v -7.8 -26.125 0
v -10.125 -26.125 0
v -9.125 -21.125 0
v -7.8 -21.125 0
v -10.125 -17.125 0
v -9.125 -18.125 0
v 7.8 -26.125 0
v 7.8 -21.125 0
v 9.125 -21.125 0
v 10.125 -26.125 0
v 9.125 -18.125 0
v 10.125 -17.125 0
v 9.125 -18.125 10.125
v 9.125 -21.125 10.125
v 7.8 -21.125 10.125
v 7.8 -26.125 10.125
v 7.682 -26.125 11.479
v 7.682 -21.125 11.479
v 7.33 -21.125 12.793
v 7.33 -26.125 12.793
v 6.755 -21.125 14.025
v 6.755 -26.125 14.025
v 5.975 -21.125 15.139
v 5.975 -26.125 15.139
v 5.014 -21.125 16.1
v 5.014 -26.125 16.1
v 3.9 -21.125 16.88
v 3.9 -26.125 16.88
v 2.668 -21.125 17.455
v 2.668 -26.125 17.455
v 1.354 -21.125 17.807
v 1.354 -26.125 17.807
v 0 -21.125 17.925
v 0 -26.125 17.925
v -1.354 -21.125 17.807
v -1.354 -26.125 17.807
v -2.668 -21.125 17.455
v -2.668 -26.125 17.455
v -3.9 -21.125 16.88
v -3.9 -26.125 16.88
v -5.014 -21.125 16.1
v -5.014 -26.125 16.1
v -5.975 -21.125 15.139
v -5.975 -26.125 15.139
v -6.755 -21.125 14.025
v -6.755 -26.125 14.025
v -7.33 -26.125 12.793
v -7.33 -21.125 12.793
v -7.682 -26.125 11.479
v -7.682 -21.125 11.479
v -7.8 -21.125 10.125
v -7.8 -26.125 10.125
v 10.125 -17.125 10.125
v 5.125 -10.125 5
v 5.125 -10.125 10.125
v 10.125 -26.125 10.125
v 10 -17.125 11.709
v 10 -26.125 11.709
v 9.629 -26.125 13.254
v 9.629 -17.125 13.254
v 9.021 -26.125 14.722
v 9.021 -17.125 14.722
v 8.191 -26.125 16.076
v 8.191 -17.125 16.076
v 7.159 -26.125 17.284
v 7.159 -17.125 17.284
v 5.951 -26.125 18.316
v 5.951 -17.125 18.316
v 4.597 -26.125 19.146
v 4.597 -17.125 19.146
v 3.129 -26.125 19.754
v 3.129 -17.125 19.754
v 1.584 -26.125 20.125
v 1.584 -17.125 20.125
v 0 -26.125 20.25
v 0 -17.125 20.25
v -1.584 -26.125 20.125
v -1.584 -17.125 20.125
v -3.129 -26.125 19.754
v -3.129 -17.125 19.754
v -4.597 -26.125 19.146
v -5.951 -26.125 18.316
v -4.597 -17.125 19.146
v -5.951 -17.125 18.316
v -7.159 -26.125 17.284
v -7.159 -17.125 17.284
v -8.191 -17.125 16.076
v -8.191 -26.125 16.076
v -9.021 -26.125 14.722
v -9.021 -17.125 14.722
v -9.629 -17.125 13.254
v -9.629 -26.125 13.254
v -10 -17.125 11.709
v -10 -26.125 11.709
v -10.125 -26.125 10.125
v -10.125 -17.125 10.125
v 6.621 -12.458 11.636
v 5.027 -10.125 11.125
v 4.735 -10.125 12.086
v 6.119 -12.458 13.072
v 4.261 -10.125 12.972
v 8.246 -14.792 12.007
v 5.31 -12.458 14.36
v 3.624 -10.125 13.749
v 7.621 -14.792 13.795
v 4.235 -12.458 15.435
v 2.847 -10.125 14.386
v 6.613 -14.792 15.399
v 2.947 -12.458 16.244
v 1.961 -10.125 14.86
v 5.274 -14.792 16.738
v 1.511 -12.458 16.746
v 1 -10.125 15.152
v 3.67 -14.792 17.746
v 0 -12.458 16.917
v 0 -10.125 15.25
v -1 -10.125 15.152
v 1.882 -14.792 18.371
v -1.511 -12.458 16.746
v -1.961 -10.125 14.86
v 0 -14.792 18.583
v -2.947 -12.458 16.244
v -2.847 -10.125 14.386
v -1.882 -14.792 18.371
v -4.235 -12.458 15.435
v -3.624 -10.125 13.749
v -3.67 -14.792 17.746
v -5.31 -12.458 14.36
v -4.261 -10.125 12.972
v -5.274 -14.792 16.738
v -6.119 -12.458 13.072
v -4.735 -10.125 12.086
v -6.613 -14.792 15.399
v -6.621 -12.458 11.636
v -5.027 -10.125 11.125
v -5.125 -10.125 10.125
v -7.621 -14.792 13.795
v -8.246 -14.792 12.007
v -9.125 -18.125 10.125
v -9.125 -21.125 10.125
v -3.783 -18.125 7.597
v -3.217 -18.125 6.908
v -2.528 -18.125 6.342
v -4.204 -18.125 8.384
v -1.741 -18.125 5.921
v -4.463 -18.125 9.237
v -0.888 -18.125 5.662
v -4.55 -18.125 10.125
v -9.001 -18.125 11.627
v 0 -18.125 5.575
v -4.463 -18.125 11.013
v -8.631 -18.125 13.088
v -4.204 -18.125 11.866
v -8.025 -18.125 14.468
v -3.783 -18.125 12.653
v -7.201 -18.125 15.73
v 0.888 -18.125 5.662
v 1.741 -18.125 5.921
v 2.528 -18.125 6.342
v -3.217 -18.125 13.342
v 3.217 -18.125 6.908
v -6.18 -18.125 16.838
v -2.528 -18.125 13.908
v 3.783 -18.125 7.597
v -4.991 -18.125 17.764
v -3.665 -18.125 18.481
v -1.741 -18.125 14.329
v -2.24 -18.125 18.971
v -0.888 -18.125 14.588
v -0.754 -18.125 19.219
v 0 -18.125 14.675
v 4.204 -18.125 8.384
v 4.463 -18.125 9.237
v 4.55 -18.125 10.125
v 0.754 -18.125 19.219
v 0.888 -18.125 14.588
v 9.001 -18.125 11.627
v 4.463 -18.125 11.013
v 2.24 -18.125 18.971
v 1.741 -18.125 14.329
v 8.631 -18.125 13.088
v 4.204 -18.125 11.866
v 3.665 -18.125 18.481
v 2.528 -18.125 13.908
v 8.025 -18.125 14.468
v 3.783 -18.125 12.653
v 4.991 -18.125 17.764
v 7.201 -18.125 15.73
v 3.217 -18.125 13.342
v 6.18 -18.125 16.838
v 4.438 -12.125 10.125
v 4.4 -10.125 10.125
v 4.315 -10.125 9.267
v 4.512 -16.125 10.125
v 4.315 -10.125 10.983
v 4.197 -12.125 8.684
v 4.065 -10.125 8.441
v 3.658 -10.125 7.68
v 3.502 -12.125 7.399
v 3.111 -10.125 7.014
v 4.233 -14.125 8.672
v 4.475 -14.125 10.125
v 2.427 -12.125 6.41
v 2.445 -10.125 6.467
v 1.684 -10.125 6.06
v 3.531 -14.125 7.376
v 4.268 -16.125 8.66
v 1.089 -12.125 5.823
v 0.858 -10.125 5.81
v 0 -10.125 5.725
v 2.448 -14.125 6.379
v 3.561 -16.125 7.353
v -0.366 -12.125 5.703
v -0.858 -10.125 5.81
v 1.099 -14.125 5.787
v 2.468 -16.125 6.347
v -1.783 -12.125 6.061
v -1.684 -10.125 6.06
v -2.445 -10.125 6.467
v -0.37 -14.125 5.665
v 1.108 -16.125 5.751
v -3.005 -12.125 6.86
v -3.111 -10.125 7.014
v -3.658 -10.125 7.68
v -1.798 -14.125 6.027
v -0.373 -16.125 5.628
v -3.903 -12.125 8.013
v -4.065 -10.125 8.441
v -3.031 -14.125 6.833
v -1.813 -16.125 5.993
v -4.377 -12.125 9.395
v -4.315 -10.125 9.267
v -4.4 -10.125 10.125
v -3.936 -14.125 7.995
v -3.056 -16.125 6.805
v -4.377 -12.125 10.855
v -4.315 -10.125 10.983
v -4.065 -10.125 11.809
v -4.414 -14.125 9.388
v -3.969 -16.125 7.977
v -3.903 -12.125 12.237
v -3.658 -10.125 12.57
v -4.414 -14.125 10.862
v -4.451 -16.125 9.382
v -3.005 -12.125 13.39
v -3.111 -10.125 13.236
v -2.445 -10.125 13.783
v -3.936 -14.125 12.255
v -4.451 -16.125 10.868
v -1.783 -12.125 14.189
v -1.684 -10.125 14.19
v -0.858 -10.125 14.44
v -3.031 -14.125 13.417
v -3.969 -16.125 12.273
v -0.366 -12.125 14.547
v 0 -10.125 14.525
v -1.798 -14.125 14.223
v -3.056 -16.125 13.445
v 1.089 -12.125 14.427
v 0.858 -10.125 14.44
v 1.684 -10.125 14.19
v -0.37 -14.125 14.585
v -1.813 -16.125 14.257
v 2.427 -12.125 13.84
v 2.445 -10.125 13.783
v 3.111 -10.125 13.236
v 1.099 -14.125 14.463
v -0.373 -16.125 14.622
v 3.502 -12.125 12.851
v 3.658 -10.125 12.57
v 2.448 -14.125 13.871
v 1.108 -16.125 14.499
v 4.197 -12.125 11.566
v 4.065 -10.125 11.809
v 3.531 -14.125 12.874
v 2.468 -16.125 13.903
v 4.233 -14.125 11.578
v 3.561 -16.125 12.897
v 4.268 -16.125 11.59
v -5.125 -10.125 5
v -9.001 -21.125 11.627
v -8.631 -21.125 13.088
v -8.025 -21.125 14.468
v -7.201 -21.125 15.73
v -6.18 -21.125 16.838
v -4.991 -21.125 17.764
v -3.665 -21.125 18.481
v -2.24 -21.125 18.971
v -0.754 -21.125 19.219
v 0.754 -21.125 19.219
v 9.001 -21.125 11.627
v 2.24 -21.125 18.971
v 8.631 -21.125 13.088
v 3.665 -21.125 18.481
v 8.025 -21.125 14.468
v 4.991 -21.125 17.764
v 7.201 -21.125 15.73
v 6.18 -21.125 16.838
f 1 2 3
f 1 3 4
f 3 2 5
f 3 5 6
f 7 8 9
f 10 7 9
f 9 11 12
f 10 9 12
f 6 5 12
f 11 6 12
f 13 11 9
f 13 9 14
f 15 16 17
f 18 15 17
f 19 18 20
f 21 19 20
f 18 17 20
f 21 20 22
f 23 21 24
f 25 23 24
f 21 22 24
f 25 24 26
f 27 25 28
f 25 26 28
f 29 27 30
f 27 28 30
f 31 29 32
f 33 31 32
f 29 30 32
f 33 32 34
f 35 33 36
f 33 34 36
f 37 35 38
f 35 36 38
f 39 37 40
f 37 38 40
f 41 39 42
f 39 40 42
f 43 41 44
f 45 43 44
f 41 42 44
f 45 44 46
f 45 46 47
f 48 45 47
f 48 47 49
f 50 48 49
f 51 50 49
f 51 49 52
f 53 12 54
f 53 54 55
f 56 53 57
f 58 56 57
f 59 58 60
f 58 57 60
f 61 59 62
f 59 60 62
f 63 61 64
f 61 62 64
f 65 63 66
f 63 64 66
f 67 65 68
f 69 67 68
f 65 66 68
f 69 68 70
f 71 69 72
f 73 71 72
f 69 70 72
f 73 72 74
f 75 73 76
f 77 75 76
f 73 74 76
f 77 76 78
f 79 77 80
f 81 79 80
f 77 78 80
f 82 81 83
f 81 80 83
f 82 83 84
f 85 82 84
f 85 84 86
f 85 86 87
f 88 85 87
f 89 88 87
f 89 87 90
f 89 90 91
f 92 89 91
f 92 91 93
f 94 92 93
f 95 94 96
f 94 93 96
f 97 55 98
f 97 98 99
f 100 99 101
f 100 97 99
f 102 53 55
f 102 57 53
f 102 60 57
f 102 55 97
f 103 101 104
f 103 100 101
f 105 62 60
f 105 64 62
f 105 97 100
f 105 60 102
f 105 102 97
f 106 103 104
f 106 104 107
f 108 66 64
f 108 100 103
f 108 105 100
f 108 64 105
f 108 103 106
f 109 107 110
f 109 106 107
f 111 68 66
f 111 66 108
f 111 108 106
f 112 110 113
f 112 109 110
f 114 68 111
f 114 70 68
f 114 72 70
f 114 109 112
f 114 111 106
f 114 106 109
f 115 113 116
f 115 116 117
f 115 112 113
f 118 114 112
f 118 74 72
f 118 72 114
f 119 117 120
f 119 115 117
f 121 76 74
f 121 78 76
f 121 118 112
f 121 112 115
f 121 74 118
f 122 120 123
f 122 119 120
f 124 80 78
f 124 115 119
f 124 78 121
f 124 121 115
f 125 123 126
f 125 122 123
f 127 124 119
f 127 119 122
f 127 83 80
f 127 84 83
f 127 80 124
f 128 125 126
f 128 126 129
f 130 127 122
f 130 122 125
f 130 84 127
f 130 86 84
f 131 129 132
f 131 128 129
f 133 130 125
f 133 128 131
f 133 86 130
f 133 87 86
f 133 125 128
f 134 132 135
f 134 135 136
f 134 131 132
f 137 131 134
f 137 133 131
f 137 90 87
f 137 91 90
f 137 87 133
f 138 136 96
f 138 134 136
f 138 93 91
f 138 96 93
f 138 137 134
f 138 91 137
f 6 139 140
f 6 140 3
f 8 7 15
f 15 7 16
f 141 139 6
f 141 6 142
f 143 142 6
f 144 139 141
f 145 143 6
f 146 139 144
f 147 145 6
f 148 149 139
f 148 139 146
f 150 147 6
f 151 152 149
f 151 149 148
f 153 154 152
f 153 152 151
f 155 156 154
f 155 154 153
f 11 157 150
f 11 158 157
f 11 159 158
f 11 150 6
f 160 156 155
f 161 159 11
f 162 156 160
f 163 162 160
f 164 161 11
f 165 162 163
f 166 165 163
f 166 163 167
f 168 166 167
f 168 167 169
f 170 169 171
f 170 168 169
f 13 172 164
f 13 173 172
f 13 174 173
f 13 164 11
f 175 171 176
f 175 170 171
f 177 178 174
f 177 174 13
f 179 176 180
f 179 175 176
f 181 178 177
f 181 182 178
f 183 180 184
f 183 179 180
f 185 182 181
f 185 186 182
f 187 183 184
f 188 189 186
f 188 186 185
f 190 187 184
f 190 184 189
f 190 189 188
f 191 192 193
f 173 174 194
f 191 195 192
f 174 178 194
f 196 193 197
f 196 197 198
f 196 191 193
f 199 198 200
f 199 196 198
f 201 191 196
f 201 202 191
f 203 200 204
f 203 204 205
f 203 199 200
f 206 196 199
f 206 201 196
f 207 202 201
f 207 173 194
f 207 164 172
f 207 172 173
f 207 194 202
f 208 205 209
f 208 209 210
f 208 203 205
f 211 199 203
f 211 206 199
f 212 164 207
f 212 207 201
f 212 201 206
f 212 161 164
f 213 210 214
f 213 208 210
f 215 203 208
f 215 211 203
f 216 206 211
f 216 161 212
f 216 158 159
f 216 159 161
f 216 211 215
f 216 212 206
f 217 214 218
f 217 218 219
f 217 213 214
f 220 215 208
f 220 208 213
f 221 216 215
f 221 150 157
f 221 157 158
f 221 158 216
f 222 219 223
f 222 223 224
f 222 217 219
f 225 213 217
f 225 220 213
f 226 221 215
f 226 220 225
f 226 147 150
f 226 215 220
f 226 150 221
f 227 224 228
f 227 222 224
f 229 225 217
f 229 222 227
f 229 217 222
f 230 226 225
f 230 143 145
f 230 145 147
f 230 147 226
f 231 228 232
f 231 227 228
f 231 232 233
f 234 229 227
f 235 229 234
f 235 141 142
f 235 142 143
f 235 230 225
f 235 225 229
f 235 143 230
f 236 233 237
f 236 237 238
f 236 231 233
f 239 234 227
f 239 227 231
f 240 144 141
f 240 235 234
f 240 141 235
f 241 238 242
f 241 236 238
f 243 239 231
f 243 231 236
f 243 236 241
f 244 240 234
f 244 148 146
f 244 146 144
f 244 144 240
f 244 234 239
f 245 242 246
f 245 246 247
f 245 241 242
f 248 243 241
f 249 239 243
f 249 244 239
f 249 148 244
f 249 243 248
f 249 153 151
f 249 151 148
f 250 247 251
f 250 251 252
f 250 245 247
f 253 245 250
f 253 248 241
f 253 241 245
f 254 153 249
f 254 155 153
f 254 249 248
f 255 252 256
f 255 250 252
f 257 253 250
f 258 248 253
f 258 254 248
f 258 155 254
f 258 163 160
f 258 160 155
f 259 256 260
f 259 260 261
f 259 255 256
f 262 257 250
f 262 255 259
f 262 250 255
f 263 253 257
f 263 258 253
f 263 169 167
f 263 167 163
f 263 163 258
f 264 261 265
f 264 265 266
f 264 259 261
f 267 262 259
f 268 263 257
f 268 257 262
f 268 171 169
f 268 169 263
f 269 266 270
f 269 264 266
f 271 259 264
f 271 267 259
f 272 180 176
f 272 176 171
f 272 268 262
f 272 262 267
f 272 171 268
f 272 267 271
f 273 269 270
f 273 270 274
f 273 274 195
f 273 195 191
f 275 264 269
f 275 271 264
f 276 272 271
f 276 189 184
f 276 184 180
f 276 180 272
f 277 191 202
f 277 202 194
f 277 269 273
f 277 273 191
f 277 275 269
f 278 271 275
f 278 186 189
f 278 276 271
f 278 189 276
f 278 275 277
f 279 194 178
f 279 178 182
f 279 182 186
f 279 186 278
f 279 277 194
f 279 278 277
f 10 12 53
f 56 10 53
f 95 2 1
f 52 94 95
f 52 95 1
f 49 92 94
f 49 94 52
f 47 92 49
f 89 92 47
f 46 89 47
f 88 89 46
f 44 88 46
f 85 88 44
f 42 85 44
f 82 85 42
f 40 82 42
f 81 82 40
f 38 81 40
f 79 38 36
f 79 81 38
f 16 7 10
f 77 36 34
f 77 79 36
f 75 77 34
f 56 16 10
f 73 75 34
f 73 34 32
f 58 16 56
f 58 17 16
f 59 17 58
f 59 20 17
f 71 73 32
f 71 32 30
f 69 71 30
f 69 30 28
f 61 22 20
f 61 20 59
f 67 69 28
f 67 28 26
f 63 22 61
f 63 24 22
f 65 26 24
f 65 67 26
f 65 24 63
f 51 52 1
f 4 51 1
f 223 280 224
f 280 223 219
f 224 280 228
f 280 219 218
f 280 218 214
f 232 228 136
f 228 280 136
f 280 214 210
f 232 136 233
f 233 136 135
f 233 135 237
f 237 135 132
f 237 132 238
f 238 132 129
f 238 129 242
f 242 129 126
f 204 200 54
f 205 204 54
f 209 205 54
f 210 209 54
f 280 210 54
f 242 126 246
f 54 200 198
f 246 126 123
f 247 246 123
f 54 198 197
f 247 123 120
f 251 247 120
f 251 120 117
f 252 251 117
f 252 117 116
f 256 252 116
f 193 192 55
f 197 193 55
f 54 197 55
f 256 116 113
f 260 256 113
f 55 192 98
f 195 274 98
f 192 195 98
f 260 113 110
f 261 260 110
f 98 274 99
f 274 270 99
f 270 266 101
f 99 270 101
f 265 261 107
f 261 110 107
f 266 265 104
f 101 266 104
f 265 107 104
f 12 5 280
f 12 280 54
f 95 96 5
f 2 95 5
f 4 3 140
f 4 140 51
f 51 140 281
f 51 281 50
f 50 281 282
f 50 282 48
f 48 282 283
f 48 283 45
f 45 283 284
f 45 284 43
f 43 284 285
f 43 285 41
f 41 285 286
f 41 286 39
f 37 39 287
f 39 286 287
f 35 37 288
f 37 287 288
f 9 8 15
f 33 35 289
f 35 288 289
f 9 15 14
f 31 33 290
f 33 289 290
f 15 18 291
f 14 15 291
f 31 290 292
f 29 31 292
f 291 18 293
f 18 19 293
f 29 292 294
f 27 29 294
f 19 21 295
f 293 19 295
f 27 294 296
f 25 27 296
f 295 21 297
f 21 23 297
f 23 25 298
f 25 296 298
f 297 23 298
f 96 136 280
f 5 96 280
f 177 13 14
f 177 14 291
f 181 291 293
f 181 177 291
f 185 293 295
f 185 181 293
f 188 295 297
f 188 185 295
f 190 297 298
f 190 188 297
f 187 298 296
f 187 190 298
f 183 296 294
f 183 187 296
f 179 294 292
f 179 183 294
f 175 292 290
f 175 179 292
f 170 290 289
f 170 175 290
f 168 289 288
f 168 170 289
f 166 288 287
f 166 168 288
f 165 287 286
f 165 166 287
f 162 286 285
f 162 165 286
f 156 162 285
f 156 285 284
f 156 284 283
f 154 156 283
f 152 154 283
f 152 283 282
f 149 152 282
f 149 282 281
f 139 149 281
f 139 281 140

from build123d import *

# Parameters (mm, degrees)
F1_DEPTH  = 16
F3_DEPTH  = 8
F5_DEPTH  = 3
F7_R      = 4.4
F6_R      = 4.55
F9_ANGLE  = 90
F10_SIZE2 = 7
F10_SIZE  = 5


with BuildPart() as f1:
    # F0 (on Top) → F1 (new body)
    with BuildSketch(Plane.XY):
        with BuildLine():
            ThreePointArc((10.125, 0), (0, 10.125), (-10.125, 0))
            Line((-10.125, 0), (-10.125, -10.125))
            Line((-10.125, -10.125), (10.125, -10.125))
            Line((10.125, -10.125), (10.125, 0))
        make_face()
    extrude(amount=F1_DEPTH)

    # F2 (on face) → F3 (cut)
    with BuildSketch(Plane.XY.offset(16)):
        with BuildLine():
            ThreePointArc((7.8, 0), (0, 7.8), (-7.8, 0))
            Line((-7.8, 0), (-7.8, -10.125))
            Line((-7.8, -10.125), (7.8, -10.125))
            Line((7.8, -10.125), (7.8, 0))
        make_face()
    extrude(amount=-F3_DEPTH, mode=Mode.SUBTRACT)

    # F4 (on face) → F5 (cut)
    with BuildSketch(Plane.XY.offset(8)):
        with BuildLine():
            ThreePointArc((9.125, 0), (0, 9.125), (-9.125, 0))
            Line((-9.125, 0), (-9.125, -10.125))
            Line((-9.125, -10.125), (9.125, -10.125))
            Line((9.125, -10.125), (9.125, 0))
        make_face()
    extrude(amount=F5_DEPTH, mode=Mode.SUBTRACT)

    # F7 (on face) → F8 section 0
    with BuildSketch(Plane(origin=(0, 0, 0), x_dir=(1, 0, 0), z_dir=(0, 0, -1))):
        Circle(F7_R)
    # F6 (on face) → F8 section 1
    with BuildSketch(Plane.XY.offset(8)):
        Circle(F6_R)
    loft(mode=Mode.SUBTRACT)


with BuildPart() as f1_1:
    # F9: moved
    add(f1.part.rotate(Axis((0, -10.125, 0), (1, 0, 0)), F9_ANGLE))

    # F10
    f10_edges = [f1_1.edges().sort_by_distance(p)[0] for p in [
        (10.125, -10.125, 5.0625),
        (0, -10.125, 20.25),
        (0, -10.125, 0),
    ]]
    f10_side = f1_1.faces().sort_by_distance((0, -10.125, 19.963622))[0]
    chamfer(f10_edges, length=F10_SIZE, length2=F10_SIZE2, reference=f10_side)


solid = f1_1.part
